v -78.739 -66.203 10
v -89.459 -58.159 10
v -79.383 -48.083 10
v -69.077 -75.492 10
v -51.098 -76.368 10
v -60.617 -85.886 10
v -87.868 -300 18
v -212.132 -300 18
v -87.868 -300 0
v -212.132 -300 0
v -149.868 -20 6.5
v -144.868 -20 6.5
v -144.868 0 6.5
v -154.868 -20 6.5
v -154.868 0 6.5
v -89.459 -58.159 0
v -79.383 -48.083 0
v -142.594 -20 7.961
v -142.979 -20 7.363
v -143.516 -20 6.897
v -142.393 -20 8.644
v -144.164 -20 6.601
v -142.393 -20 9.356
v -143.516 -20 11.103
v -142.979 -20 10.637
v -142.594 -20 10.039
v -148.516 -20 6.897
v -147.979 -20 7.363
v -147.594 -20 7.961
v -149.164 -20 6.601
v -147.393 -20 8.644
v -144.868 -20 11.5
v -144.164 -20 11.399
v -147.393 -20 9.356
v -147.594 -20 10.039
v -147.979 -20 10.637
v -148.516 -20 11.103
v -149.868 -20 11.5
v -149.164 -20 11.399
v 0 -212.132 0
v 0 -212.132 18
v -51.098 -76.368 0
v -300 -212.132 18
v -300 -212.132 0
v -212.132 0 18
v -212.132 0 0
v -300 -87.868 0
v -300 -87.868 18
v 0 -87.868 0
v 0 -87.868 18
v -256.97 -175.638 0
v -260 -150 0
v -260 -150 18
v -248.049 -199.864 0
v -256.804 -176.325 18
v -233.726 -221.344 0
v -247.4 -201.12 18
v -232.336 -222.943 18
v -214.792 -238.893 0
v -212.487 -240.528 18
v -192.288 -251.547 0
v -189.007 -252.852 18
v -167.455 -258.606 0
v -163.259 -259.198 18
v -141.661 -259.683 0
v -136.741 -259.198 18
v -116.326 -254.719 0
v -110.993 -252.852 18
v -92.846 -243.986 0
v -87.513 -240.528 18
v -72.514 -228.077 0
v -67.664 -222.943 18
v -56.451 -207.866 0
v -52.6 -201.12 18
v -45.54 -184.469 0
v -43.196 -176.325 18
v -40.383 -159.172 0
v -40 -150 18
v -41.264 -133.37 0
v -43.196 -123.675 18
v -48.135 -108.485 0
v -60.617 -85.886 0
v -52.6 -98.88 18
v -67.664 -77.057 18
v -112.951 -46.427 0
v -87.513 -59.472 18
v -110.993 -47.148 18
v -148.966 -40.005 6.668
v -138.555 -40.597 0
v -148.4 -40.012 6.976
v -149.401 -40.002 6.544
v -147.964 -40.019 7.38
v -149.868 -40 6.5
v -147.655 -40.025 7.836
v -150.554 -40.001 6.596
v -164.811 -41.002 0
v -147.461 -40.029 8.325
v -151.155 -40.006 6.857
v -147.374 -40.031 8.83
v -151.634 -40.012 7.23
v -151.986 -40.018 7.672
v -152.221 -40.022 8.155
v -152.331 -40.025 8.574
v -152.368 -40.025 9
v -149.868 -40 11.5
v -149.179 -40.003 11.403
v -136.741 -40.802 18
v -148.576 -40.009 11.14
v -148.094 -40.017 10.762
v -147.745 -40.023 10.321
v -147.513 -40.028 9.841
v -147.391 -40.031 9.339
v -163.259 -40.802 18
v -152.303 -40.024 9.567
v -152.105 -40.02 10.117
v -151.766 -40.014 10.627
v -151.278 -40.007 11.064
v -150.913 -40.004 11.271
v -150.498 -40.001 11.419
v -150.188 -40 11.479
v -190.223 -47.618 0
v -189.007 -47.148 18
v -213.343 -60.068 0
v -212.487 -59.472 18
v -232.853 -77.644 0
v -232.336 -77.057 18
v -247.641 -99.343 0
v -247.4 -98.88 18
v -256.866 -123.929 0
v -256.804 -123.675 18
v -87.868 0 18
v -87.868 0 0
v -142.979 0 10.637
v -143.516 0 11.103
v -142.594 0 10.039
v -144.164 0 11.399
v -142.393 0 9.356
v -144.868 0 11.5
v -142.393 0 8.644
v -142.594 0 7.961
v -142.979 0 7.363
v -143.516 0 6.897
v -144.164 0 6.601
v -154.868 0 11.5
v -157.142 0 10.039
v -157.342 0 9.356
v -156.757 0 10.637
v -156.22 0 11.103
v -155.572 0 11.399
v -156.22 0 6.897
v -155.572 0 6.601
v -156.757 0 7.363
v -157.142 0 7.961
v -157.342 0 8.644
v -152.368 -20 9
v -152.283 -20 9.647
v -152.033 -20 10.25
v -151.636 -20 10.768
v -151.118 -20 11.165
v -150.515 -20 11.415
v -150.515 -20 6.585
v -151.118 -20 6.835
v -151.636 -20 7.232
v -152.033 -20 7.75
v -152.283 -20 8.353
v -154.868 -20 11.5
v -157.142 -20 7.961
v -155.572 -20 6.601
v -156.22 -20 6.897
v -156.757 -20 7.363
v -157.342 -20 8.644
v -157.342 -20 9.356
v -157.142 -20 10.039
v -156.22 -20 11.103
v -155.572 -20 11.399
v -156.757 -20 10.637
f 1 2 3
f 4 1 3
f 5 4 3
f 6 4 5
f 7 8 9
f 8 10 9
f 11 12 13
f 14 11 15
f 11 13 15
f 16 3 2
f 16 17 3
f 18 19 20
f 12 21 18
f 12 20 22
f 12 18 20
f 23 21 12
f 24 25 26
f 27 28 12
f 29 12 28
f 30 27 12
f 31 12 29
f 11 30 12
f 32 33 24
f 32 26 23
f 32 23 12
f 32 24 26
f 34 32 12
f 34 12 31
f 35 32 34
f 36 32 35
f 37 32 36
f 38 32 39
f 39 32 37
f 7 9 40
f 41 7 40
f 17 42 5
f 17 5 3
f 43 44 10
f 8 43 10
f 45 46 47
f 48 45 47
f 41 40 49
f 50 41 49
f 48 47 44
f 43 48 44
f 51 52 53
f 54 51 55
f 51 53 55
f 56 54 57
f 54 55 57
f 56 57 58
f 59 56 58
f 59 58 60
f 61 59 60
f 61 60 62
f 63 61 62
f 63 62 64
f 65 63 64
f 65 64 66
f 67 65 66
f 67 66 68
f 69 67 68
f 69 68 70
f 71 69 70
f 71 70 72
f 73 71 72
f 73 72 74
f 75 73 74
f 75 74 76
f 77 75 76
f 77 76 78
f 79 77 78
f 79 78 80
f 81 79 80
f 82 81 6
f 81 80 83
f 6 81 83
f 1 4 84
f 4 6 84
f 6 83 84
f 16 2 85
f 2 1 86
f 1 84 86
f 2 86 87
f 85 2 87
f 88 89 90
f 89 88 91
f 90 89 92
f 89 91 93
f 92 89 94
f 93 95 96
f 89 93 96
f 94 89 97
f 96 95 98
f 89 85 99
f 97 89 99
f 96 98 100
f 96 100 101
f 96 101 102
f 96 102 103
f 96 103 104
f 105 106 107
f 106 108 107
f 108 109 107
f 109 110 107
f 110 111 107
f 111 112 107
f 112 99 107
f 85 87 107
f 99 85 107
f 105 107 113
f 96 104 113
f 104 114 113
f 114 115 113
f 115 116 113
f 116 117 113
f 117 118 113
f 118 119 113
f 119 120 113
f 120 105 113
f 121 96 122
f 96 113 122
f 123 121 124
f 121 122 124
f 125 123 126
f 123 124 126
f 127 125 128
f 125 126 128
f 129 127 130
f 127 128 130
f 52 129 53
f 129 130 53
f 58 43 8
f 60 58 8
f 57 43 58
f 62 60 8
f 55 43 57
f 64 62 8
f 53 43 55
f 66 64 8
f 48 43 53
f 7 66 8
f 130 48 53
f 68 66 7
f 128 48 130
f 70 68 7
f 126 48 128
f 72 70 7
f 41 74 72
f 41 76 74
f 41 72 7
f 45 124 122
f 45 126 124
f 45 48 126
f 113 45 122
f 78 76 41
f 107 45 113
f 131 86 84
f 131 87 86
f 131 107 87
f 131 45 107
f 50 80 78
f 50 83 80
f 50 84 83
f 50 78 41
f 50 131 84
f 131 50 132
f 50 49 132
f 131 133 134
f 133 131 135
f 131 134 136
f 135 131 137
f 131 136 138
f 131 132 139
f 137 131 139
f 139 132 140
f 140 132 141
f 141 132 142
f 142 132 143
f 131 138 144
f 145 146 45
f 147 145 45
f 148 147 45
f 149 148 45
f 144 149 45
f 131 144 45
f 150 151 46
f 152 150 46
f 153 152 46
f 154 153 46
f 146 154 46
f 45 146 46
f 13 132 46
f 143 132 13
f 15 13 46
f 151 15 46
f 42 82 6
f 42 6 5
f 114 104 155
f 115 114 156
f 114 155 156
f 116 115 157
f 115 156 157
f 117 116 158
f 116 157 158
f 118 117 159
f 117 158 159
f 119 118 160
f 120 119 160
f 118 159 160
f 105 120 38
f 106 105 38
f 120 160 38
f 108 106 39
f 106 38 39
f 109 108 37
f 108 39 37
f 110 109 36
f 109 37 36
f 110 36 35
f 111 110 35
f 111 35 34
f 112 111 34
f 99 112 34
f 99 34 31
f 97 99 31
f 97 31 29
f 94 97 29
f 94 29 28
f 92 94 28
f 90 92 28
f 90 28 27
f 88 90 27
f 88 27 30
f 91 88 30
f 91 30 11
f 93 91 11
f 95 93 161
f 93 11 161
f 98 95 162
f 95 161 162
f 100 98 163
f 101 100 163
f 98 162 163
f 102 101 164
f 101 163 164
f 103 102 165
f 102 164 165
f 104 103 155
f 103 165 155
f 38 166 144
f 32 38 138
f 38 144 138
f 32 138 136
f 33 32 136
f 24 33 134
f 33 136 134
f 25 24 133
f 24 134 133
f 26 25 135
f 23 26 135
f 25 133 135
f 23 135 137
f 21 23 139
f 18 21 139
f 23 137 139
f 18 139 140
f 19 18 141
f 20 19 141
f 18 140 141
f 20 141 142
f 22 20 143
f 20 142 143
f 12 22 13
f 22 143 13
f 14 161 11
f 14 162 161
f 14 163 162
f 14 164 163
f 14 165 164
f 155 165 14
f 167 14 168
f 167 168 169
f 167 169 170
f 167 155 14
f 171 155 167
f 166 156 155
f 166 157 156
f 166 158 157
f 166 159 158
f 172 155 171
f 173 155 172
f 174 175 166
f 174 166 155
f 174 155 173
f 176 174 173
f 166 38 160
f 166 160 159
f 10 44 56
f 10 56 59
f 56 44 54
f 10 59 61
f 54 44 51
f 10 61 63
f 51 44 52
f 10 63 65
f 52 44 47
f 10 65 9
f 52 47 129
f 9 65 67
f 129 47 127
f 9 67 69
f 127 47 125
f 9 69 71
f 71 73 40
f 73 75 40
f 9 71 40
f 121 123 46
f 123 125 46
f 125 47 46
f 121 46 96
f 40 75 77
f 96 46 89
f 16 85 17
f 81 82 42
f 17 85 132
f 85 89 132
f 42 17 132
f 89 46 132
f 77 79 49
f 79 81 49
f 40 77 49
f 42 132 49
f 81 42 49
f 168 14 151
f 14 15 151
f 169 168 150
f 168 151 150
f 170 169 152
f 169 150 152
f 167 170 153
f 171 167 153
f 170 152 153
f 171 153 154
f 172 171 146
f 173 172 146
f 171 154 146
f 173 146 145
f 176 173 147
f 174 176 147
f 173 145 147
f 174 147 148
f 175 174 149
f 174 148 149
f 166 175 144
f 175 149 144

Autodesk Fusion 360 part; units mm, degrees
sketch "Skizze1" plane through (0, 0, 0) normal (0, 0, 1) x (1, 0, 0)
  line L0 (-87.8679, 0) -> (-212.132, 0)
  line L1 (-300, -87.868) -> (-300, -212.132)
  line L2 (-212.132, -300) -> (-87.8679, -300)
  line L3 (0, -212.1321) -> (0, -87.8679)
  line L4 (0, -87.8679) -> (-87.8679, 0)
  line L5 (-212.132, 0) -> (-300, -87.868)
  line L6 (-300, -212.132) -> (-212.132, -300)
  line L7 (-87.8679, -300) -> (0, -212.1321)
  dimension "d3" = 45
  dimension "d4" = 45
  dimension "d5" = 300
  dimension "d6" = 300
  dimension "d9" = 87.8679
  dimension "d10" = 87.8679
  dimension "d11" = 300
  dimension "d12" = 300
extrude "Extrusion1" add sketch "Skizze1" along normal blind 18
sketch "Skizze2" plane through (0, 0, 18) normal (0, 0, 1) x (-1, 0, 0)
  line L0 (87.8679, 300) -> (0, 212.1321)
  line L1 (0, 212.1321) -> (0, 87.8679)
  line L2 (0, 87.8679) -> (87.8679, 0)
  line L3 (87.8679, 0) -> (212.132, 0)
  line L4 (212.132, 0) -> (300, 87.868)
  line L5 (300, 87.868) -> (300, 212.132)
  line L6 (300, 212.132) -> (212.132, 300)
  line L7 (212.132, 300) -> (87.8679, 300)
  circle A0 centre (150, 150) radius 110
  dimension "d15" = 150
  dimension "d16" = 150
  dimension "d17" = 220
extrude "Extrusion2" cut sketch "Skizze2" against normal blind 18 contours A0
sketch "Skizze3" plane through (0, 0, 0) normal (0, 0, -1) x (1, 0, 0)
  circle A0 centre (-150, 150) radius 110
  line L0 (0, 212.1321) -> (-87.8679, 300)
  line L1 (-87.8679, 300) -> (-212.132, 300)
  line L2 (-212.132, 300) -> (-300, 212.132)
  line L3 (-300, 212.132) -> (-300, 87.868)
  line L4 (-300, 87.868) -> (-212.132, 0)
  line L5 (-212.132, 0) -> (-87.8679, 0)
  line L6 (-87.8679, 0) -> (0, 87.8679)
  line L7 (0, 87.8679) -> (0, 212.1321)
  line L8 (-65.2405, 90.5097) -> (-51.0983, 76.3675)
  line L9 (-51.0983, 76.3675) -> (-79.3826, 48.0833)
  line L10 (-79.3826, 48.0833) -> (-93.5248, 62.2254)
  line L11 (-93.5248, 62.2254) -> (-65.2405, 90.5097)
  dimension "d20" = 28
  dimension "d21" = 40
  dimension "d22" = 40
  dimension "d23" = 20
extrude "Extrusion3" cut sketch "Skizze3" against normal blind 10 contours A0 L8 L9 L10
sketch "Skizze4" plane through (0, 0, 0) normal (0, 1, 0) x (-1, 0, 0)
  line L0 (87.8679, 0) -> (212.132, 0)
  line L1 (212.132, 0) -> (212.132, 18)
  line L2 (212.132, 18) -> (87.8679, 18)
  line L3 (87.8679, 18) -> (87.8679, 0)
  line L4 (144.8679, 6.5) -> (154.8679, 6.5)
  arc A0 (154.8679, 6.5) -> (154.8679, 11.5) centre (154.8679, 9) ccw
  line L5 (154.8679, 11.5) -> (144.8679, 11.5)
  arc A1 (144.8679, 11.5) -> (144.8679, 6.5) centre (144.8679, 9) ccw
  dimension "d26" = 5
  dimension "d27" = 10
  dimension "d28" = 9
  dimension "d30" = 57
extrude "Extrusion4" cut sketch "Skizze4" against normal blind 20 contours L4 A0 L5 A1
sketch "Skizze5" plane through (0, -20, 0) normal (0, 1, 0) x (-1, 0, 0)
  arc A0 (144.8679, 11.5) -> (144.8679, 6.5) centre (144.8679, 9) ccw
  line L0 (144.8679, 6.5) -> (154.8679, 6.5)
  arc A1 (154.8679, 6.5) -> (154.8679, 11.5) centre (154.8679, 9) ccw
  line L1 (154.8679, 11.5) -> (144.8679, 11.5)
  circle A2 centre (149.8679, 9) radius 2.5
  dimension "d33" = 5
  dimension "d34" = 5
  dimension "d35" = 2.5
extrude "Extrusion5" cut sketch "Skizze5" against normal blind 40 contours A2
equation "d30 = ( 124 / 2 ) * 1 mm - 5 mm"
